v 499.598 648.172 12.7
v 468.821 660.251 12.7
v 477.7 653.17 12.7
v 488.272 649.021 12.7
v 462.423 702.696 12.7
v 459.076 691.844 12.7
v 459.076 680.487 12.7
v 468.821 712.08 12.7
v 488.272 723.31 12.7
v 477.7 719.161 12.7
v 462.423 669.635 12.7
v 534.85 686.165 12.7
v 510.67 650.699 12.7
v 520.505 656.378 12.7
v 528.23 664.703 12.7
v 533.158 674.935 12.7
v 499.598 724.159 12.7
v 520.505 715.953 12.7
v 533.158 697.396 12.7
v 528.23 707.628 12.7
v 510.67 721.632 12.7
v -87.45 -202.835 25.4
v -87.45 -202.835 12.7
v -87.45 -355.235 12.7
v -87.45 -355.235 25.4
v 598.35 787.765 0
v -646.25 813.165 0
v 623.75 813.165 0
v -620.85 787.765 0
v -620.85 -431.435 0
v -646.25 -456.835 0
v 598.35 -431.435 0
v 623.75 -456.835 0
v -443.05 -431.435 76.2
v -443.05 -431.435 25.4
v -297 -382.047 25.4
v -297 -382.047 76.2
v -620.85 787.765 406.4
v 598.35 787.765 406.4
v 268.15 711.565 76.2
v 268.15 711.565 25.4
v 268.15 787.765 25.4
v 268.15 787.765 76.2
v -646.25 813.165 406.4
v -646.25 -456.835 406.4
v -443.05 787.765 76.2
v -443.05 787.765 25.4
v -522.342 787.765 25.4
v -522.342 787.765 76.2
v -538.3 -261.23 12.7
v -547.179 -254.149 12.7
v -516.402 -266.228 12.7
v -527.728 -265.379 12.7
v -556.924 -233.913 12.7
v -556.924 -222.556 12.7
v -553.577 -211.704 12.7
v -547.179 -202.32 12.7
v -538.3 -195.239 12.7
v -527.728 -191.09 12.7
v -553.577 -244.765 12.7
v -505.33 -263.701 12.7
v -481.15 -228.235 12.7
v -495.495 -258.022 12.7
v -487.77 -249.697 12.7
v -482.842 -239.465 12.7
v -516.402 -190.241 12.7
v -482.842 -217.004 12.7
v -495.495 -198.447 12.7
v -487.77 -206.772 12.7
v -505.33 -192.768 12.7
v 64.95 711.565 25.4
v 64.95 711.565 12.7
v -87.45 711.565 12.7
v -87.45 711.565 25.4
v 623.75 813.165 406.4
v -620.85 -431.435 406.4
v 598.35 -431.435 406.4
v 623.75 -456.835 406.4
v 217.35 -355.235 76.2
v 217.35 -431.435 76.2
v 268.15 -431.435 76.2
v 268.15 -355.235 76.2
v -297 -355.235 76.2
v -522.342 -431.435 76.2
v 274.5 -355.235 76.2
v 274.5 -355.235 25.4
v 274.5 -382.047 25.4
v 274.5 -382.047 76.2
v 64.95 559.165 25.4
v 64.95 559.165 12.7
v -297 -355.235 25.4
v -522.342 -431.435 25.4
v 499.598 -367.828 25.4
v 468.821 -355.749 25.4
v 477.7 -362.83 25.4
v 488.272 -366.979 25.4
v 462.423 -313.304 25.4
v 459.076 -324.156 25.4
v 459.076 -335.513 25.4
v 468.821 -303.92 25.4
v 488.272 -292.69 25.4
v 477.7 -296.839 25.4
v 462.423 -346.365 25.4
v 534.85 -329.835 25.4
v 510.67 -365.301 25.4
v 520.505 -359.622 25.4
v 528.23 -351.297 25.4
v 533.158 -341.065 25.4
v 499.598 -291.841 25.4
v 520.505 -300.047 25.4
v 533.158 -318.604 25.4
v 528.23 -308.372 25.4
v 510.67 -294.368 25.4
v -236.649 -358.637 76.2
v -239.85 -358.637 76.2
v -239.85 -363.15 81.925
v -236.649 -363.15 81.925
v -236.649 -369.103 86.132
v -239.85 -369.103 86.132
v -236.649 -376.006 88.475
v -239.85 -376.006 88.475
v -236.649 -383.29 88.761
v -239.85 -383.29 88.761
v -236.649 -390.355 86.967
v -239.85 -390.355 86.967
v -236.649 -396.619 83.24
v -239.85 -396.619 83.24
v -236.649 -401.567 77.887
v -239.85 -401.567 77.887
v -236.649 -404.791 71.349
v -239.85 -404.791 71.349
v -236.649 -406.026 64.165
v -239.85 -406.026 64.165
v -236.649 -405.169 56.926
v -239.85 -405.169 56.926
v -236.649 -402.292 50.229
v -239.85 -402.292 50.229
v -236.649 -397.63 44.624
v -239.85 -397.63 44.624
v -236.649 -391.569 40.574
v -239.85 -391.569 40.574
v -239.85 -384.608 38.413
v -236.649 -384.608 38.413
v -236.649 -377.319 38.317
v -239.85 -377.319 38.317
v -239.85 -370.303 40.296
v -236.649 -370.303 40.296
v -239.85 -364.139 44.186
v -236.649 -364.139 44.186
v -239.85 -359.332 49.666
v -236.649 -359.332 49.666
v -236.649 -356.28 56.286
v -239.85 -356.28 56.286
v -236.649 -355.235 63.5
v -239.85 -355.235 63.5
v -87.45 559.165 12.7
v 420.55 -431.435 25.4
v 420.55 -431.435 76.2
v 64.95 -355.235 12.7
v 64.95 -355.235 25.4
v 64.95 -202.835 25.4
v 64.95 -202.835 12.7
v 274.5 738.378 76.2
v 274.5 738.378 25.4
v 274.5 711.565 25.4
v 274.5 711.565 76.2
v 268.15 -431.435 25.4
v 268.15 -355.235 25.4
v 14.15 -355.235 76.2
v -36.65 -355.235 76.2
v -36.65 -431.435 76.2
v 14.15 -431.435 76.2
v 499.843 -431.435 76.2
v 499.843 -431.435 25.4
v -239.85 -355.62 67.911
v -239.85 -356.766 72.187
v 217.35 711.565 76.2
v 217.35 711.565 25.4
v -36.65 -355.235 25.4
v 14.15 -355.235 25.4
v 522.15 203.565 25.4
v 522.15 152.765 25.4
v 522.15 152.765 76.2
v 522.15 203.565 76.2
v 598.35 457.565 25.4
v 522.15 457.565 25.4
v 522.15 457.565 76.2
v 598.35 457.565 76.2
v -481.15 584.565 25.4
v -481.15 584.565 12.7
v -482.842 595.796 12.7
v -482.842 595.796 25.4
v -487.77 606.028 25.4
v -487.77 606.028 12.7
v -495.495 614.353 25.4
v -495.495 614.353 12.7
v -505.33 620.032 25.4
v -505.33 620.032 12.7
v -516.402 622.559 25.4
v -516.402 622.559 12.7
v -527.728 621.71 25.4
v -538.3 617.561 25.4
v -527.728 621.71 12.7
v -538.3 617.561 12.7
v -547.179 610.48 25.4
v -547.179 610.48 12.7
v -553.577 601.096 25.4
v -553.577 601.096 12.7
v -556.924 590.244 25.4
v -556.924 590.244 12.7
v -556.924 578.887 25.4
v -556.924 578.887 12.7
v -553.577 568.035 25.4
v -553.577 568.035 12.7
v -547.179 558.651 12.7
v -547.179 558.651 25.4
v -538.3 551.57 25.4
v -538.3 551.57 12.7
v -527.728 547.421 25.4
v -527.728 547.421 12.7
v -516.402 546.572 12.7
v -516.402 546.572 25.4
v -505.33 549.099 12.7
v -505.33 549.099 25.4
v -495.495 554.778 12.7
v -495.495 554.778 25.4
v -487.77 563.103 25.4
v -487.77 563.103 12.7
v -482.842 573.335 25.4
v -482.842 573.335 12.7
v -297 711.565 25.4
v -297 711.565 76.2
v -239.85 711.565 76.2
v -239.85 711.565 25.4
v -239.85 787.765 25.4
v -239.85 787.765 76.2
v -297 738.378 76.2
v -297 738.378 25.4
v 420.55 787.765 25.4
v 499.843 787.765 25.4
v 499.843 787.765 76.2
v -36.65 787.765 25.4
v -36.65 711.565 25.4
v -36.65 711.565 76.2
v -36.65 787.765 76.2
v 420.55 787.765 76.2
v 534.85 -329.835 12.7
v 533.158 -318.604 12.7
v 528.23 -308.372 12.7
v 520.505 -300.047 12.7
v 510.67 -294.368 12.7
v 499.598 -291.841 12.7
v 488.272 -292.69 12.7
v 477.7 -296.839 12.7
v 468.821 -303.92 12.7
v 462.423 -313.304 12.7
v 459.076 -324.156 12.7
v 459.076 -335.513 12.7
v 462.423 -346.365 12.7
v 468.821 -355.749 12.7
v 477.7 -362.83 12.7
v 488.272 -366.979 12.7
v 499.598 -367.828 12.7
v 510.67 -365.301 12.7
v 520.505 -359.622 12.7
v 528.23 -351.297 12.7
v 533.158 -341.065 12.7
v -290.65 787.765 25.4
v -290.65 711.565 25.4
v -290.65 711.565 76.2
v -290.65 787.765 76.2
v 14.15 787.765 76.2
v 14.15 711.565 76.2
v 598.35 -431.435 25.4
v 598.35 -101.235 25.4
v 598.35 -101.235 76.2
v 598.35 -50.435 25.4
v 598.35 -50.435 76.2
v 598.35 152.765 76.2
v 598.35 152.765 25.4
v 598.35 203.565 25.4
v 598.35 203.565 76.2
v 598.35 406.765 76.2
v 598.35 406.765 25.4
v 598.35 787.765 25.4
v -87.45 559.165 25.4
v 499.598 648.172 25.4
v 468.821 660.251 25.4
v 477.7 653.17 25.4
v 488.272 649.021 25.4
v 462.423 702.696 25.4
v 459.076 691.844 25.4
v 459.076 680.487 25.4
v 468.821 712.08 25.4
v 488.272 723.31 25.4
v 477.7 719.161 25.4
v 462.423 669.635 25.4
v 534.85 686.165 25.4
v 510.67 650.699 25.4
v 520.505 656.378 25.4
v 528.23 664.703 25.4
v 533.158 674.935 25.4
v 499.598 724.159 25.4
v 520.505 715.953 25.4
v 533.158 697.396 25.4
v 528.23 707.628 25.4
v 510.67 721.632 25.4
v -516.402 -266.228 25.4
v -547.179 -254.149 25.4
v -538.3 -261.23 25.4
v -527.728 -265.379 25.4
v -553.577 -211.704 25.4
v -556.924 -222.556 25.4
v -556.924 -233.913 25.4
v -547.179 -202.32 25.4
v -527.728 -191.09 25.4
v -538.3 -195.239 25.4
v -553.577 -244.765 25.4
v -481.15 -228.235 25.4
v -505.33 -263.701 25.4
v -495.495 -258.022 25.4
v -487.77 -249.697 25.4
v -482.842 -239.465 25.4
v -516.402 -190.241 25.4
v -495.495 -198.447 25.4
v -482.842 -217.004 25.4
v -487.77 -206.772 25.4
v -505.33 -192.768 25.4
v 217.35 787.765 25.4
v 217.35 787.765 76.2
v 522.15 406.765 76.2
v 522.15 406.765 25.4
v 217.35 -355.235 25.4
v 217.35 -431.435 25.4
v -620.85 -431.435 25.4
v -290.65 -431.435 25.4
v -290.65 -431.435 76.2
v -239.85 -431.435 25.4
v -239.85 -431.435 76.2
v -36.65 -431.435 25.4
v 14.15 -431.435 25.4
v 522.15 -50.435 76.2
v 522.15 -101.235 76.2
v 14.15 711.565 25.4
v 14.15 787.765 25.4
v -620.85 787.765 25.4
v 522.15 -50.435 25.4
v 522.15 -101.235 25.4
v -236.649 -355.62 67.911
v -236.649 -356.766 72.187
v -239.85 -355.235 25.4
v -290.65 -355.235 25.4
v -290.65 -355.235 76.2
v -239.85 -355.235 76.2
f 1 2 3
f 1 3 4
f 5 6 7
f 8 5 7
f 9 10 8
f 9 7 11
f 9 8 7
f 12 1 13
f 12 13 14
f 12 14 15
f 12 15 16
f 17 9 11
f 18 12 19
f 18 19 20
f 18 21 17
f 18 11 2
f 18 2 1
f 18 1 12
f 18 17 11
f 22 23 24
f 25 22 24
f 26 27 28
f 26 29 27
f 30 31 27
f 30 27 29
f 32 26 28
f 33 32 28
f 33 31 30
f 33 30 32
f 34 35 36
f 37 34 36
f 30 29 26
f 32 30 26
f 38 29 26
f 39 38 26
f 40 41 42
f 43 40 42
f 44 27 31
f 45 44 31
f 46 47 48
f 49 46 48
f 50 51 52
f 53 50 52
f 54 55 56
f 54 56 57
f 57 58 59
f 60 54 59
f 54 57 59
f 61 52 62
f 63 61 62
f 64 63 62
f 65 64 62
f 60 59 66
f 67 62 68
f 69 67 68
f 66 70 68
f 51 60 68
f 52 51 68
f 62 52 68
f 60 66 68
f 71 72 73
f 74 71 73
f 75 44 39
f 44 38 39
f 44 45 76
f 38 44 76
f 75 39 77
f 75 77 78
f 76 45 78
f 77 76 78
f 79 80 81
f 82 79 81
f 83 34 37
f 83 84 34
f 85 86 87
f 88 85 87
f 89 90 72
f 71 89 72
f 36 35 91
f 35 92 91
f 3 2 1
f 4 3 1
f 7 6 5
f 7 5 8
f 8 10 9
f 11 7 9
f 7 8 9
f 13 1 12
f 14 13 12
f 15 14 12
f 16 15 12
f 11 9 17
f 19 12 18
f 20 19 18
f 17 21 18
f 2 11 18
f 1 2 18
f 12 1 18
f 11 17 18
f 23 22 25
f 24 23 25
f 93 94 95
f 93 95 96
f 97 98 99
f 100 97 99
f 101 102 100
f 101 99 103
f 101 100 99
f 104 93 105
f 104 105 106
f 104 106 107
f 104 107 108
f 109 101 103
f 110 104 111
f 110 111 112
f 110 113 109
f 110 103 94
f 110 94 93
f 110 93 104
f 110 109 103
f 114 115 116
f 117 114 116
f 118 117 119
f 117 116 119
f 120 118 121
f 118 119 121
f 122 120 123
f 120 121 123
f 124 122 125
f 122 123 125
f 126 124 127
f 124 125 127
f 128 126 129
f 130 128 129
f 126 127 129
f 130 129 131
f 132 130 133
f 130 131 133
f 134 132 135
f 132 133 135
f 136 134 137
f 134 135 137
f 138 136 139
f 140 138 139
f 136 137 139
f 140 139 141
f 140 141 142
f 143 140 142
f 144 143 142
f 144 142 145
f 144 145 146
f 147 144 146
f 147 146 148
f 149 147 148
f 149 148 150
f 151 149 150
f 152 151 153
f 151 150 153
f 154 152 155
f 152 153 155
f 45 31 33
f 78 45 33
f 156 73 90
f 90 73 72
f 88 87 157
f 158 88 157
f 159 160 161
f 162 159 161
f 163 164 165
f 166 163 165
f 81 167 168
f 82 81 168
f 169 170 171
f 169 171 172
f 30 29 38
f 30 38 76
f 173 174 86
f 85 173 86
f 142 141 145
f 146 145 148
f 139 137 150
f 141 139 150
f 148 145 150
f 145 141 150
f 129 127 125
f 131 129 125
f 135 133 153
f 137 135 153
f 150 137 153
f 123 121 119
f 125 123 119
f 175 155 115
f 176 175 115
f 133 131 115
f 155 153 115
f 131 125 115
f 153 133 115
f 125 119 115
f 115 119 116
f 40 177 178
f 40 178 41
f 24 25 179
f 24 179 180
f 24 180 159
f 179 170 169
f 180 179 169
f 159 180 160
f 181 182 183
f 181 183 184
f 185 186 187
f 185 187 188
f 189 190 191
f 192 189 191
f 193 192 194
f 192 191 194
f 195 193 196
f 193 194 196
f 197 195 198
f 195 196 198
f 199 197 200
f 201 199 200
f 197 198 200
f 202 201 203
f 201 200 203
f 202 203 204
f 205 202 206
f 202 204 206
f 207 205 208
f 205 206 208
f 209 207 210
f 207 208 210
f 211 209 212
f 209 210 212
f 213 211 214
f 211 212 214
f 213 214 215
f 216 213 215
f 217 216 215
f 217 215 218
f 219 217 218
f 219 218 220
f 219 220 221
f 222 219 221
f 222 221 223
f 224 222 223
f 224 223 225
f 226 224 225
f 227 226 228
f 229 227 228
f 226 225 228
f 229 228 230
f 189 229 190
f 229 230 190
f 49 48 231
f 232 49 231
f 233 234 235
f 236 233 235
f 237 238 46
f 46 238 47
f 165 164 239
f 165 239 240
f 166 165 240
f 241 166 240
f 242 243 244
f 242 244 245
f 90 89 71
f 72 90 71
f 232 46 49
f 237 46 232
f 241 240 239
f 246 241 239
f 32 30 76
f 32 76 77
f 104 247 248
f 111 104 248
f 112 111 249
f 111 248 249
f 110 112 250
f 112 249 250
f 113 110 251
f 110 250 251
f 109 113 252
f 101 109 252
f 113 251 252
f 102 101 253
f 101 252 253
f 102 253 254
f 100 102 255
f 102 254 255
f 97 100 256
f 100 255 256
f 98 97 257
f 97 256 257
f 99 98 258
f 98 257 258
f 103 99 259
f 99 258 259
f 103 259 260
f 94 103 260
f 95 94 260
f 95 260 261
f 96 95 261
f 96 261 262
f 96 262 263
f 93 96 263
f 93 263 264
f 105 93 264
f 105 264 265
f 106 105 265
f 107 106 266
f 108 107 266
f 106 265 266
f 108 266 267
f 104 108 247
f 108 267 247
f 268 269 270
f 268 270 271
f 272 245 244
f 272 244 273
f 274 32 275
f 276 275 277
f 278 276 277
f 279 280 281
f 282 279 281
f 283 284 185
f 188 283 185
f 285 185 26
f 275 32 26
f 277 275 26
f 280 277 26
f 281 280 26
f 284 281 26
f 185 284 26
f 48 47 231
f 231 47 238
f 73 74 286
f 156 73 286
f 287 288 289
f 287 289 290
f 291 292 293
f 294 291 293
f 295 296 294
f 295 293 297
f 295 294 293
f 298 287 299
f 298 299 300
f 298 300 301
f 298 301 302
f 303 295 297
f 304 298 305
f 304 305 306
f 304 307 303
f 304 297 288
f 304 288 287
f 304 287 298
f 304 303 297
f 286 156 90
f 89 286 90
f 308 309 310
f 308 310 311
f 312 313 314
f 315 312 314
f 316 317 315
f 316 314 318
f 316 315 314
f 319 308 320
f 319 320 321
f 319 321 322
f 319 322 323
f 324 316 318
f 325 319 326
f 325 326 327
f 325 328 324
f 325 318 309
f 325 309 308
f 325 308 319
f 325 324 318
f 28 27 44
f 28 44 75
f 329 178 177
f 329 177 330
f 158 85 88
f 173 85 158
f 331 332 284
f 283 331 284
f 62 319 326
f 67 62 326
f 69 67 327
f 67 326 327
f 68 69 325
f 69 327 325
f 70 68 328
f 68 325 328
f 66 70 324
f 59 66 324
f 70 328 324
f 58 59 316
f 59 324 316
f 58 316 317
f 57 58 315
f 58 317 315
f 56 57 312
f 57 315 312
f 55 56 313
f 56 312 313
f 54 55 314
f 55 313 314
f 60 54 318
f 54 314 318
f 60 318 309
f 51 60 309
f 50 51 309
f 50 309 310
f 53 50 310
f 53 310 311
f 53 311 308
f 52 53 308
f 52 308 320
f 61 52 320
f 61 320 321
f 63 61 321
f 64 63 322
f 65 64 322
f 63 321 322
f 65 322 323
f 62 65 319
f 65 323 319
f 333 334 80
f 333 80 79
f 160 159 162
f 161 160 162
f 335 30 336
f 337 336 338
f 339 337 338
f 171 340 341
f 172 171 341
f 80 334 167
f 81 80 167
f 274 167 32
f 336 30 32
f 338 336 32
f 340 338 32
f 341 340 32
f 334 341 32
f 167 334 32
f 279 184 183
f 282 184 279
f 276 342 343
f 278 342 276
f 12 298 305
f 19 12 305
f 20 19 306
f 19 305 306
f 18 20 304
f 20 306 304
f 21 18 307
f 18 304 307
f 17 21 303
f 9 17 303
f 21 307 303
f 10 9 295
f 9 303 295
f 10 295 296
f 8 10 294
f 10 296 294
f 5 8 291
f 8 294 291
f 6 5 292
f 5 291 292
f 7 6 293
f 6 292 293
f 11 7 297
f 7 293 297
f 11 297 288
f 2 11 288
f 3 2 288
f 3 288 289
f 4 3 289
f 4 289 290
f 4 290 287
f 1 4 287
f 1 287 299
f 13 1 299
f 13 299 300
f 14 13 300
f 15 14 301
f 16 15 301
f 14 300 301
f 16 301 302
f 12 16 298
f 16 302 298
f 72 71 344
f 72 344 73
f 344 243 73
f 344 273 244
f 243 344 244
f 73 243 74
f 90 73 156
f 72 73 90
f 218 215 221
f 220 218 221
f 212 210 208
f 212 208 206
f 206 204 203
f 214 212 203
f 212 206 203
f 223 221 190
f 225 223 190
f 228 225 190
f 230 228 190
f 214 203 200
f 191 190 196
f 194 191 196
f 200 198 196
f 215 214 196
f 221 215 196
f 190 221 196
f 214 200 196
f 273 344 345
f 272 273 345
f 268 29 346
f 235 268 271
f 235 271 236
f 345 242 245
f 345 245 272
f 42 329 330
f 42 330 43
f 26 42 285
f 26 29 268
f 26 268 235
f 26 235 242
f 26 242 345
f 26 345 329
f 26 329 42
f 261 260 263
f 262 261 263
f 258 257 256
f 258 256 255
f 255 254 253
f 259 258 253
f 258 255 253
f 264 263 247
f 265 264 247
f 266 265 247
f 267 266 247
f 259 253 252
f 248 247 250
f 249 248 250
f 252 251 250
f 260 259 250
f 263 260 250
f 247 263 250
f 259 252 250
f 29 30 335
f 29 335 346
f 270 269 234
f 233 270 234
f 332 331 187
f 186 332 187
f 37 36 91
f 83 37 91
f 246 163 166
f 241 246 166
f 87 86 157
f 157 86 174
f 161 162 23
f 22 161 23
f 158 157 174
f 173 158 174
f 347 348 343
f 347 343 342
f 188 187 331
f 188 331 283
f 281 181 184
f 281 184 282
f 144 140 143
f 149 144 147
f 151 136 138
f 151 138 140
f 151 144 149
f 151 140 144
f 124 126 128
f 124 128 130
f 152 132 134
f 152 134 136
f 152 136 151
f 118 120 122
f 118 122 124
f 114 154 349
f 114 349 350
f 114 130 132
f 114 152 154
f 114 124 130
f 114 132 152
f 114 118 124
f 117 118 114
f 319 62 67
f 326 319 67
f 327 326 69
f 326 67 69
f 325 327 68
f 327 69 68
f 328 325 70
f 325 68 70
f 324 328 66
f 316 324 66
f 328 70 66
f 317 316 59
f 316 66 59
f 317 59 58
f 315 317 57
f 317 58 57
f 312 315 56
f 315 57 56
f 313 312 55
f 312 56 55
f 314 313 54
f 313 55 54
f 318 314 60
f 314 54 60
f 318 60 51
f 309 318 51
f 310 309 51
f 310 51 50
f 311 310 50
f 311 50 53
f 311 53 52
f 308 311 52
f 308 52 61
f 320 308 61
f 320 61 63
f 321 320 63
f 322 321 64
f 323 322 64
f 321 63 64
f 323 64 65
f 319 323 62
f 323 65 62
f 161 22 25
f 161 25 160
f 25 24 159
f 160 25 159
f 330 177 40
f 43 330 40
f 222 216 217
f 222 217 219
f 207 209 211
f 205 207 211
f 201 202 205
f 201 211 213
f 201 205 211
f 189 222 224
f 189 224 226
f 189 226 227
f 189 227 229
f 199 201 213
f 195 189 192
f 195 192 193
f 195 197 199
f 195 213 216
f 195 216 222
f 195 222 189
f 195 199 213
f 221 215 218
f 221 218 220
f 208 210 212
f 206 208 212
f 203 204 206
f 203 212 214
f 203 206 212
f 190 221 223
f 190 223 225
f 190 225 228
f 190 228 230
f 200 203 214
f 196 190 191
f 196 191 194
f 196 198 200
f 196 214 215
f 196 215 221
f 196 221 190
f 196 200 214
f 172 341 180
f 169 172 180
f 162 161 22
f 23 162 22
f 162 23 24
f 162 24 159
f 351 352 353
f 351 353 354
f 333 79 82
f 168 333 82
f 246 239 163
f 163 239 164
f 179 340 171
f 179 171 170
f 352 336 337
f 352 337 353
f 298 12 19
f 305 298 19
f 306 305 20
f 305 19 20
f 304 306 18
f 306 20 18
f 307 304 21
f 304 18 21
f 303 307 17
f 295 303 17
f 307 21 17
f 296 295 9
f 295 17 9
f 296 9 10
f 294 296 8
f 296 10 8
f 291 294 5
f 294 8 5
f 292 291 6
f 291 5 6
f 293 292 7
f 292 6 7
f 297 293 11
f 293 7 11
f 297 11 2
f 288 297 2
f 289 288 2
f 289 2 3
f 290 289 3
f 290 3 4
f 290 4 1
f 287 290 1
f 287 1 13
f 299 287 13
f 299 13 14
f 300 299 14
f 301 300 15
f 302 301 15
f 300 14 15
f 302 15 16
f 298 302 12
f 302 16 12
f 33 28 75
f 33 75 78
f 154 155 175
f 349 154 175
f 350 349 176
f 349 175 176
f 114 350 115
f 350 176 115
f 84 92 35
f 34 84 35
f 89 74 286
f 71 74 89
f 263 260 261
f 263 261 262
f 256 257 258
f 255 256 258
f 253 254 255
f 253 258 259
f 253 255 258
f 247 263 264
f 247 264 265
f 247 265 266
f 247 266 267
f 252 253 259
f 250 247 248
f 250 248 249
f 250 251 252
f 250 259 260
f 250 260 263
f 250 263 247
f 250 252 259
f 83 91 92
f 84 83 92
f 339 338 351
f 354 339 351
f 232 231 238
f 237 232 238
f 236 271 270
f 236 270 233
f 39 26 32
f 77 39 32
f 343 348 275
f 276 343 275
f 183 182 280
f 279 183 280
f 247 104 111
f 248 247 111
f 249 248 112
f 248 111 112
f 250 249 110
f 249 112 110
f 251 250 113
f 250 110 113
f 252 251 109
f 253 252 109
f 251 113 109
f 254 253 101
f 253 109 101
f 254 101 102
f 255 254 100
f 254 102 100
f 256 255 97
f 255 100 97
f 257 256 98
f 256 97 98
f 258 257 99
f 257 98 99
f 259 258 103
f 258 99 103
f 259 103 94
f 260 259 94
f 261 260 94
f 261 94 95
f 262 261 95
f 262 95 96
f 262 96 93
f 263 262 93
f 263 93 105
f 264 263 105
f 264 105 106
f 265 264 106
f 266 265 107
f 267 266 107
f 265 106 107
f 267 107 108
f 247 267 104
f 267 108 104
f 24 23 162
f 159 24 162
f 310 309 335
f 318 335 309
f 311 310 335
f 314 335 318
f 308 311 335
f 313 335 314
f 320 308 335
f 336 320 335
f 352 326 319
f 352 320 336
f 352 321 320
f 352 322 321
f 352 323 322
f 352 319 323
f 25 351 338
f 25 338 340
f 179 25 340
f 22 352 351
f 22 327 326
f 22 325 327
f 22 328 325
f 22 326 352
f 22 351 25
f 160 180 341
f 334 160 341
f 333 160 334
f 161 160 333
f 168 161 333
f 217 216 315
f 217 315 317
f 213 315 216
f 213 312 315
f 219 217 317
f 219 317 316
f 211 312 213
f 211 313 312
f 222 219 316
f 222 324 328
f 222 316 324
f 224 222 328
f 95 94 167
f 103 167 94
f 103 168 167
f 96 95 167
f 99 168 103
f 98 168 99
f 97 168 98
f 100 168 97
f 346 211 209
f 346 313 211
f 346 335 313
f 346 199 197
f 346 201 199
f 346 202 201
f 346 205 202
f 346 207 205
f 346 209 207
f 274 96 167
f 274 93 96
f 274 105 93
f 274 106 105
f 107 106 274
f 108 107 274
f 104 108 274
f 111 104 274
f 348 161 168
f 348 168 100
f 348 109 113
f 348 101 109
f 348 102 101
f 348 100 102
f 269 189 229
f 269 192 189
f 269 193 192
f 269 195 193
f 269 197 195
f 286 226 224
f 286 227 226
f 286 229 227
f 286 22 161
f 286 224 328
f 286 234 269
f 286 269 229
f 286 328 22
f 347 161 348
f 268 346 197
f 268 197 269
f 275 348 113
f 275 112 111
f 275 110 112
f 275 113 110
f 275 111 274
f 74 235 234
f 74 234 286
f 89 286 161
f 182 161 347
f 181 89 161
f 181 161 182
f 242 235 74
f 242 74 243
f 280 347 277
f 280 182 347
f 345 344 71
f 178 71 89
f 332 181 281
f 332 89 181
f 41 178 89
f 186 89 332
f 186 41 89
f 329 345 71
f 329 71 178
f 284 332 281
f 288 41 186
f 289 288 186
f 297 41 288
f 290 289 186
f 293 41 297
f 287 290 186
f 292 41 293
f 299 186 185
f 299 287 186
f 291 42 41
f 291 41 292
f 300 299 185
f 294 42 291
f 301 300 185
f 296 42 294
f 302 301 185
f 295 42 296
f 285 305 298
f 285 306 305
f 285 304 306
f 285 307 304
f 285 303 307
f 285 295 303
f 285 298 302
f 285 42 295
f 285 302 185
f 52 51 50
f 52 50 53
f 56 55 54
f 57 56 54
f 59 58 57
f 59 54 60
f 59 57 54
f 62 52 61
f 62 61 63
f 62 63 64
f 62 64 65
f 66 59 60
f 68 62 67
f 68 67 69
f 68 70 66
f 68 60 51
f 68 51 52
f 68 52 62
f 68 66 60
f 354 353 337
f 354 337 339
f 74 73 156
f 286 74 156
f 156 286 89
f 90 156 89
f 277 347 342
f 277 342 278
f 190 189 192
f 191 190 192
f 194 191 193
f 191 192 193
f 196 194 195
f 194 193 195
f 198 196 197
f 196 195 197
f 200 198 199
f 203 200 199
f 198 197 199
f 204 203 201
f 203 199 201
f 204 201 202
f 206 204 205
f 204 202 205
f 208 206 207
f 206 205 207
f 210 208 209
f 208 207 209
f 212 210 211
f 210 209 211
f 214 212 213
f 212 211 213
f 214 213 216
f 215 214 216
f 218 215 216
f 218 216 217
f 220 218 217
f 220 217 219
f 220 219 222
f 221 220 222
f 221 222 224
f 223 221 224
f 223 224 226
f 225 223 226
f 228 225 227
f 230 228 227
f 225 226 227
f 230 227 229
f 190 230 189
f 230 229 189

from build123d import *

# Parameters (mm, degrees)
F0_W      = 1219.2
F0_H      = 1219.2
F1_DEPTH  = 25.4
F2_W      = 50.8
F2_H      = 76.2
F3_DEPTH  = 50.8
F5_DEPTH  = 50.8
F6_W      = 76.2
F6_H      = 50.8
F7_DEPTH  = 50.8
F8_W      = 1320.8
F8_H      = 1320.8
F8_W_2    = 1219.2
F8_H_2    = 1219.2
F9_DEPTH  = 609.6
F10_DEPTH = 25.4
F11_DEPTH = 25.4
F12_DEPTH = 25.4
F13_DEPTH = 25.4
F14_DEPTH = 203.2
F16_DEPTH = 12.7
F17_DEPTH = 12.7
F18_R     = 38.1
F19_DEPTH = 12.7
F20_DEPTH = 12.7
F22_DEPTH = 3.2004


with BuildPart() as f1:
    # F0 (on Top) → F1 (new body)
    with BuildSketch(Plane.XY):
        with Locations((-11.2496111542, 178.1654882305)):
            Rectangle(F0_W, F0_H)
    extrude(amount=F1_DEPTH)

    # F2 (on face) → F3 (join)
    with BuildSketch(Plane.XY.offset(25.4)):
        with Locations((-265.2496111542, 749.6654882305)):
            Rectangle(F2_W, F2_H)
        with Locations((-11.2496111542, 749.6654882305)):
            Rectangle(F2_W, F2_H)
        with Locations((242.7503888458, 749.6654882305)):
            Rectangle(F2_W, F2_H)
        with Locations((-265.2496111542, -393.3345117695)):
            Rectangle(F2_W, F2_H)
        with Locations((-11.2496111542, -393.3345117695)):
            Rectangle(F2_W, F2_H)
        with Locations((242.7503888458, -393.3345117695)):
            Rectangle(F2_W, F2_H)
    extrude(amount=F3_DEPTH)

    # F6 (on face) → F7 (join)
    with BuildSketch(Plane.XY.offset(25.4)):
        with Locations((560.2503888458, 432.1654882305)):
            Rectangle(F6_W, F6_H)
        with Locations((560.2503888458, 178.1654882305)):
            Rectangle(F6_W, F6_H)
        with Locations((560.2503888458, -75.8345117695)):
            Rectangle(F6_W, F6_H)
    extrude(amount=F7_DEPTH)

    # F15 (on face) → F16 (cut)
    with BuildSketch(Plane.XY.offset(25.4)):
        Polygon((14.1503888458, 711.5654882305), (-36.6496111542, 711.5654882305), (-87.4496111542, 711.5654882305), (-87.4496111542, 559.1654882305), (64.9503888458, 559.1654882305), (64.9503888458, 711.5654882305), align=None)
        Polygon((64.9503888458, -355.2345117695), (64.9503888458, -202.8345117695), (-87.4496111542, -202.8345117695), (-87.4496111542, -355.2345117695), (-36.6496111542, -355.2345117695), (14.1503888458, -355.2345117695), align=None)
    extrude(amount=-F16_DEPTH, mode=Mode.SUBTRACT)


with BuildPart() as f5:
    # F4 (on face) → F5 (new body)
    with BuildSketch(Plane.XY.offset(25.4)):
        Polygon((-296.9996111542, 738.3783945932), (-443.0496111542, 787.7654882305), (-522.3420879098, 787.7654882305), (-296.9996111542, 711.5654882305), align=None)
    extrude(amount=F5_DEPTH)


with BuildPart() as f5b:
    # F4 (on face) → F5, piece 2 (new body)
    with BuildSketch(Plane.XY.offset(25.4)):
        Polygon((274.5003888458, 711.5654882305), (499.8428656014, 787.7654882305), (420.5503888458, 787.7654882305), (274.5003888458, 738.3783945932), align=None)
    extrude(amount=F5_DEPTH)


with BuildPart() as f5c:
    # F4 (on face) → F5, piece 3 (new body)
    with BuildSketch(Plane.XY.offset(25.4)):
        Polygon((499.8428656014, -431.4345117695), (274.5003888458, -355.2345117695), (274.5003888458, -382.0474181321), (420.5503888458, -431.4345117695), align=None)
    extrude(amount=F5_DEPTH)


with BuildPart() as f5d:
    # F4 (on face) → F5, piece 4 (new body)
    with BuildSketch(Plane.XY.offset(25.4)):
        Polygon((-522.3420879098, -431.4345117695), (-443.0496111542, -431.4345117695), (-296.9996111542, -382.0474181321), (-296.9996111542, -355.2345117695), align=None)
    extrude(amount=F5_DEPTH)


with BuildPart() as f9:
    # F8 (on face) → F9 (new body)
    with BuildSketch(Plane(origin=(0, 0, 0), x_dir=(1, 0, 0), z_dir=(0, 0, -1))):
        with Locations((-11.2496111542, -178.1654882305)):
            Rectangle(F8_W, F8_H)
        with Locations((-11.2496111542, -178.1654882305)):
            Rectangle(F8_W_2, F8_H_2, mode=Mode.SUBTRACT)
    extrude(amount=-F9_DEPTH)

    # F10 (cut): a face of the model
    f10_faces = [f9.faces().sort_by_distance(p)[0] for p in [
        (-11.2496111542, 838.5654882305, 304.8),
    ]]
    extrude(f10_faces, amount=-F10_DEPTH, mode=Mode.SUBTRACT)

    # F11 (cut): a face of the model
    f11_faces = [f9.faces().sort_by_distance(p)[0] for p in [
        (-671.6496111542, 165.4654882305, 304.8),
    ]]
    extrude(f11_faces, amount=-F11_DEPTH, mode=Mode.SUBTRACT)

    # F12 (cut): a face of the model
    f12_faces = [f9.faces().sort_by_distance(p)[0] for p in [
        (1.4503888458, -482.2345117695, 304.8),
    ]]
    extrude(f12_faces, amount=-F12_DEPTH, mode=Mode.SUBTRACT)

    # F13 (cut): a face of the model
    f13_faces = [f9.faces().sort_by_distance(p)[0] for p in [
        (649.1503888458, 178.1654882305, 304.8),
    ]]
    extrude(f13_faces, amount=-F13_DEPTH, mode=Mode.SUBTRACT)

    # F14 (cut): a face of the model
    f14_faces = [f9.faces().sort_by_distance(p)[0] for p in [
        (605.7898766037, 178.1654882305, 609.6),
    ]]
    extrude(f14_faces, amount=-F14_DEPTH, mode=Mode.SUBTRACT)


with BuildPart() as f17:
    # F17 (new): a face of the model
    f17_faces = [f1.part.faces().sort_by_distance(p)[0] for p in [
        (-11.2496111542, 635.3654882305, 12.7),
    ]]
    extrude(f17_faces, amount=F17_DEPTH)


with BuildPart() as f17b:
    # F17#2 (new): a face of the model
    f17_2_faces = [f1.part.faces().sort_by_distance(p)[0] for p in [
        (-11.2496111542, -279.0345117695, 12.7),
    ]]
    extrude(f17_2_faces, amount=F17_DEPTH)


with BuildPart() as f1_1:
    add(f1.part)

    # F18 (on face) → F19 (cut)
    with BuildSketch(Plane.XY.offset(25.4)):
        with Locations((-519.2496111542, 584.5654882305)):
            Circle(F18_R)
        with Locations((-519.2496111542, -228.2345117695)):
            Circle(F18_R)
        with Locations((496.7503888458, -329.8345117695)):
            Circle(F18_R)
        with Locations((496.7503888458, 686.1654882305)):
            Circle(F18_R)
    extrude(amount=-F19_DEPTH, mode=Mode.SUBTRACT)


with BuildPart() as f20:
    # F20 (new): a face of the model
    f20_faces = [f1_1.part.faces().sort_by_distance(p)[0] for p in [
        (-519.2496111542, -228.2345117695, 12.7),
    ]]
    extrude(f20_faces, amount=F20_DEPTH)


with BuildPart() as f20b:
    # F20#2 (new): a face of the model
    f20_2_faces = [f1_1.part.faces().sort_by_distance(p)[0] for p in [
        (-519.2496111542, 584.5654882305, 12.7),
    ]]
    extrude(f20_2_faces, amount=F20_DEPTH)


with BuildPart() as f20c:
    # F20#3 (new): a face of the model
    f20_3_faces = [f1_1.part.faces().sort_by_distance(p)[0] for p in [
        (496.7503888458, 686.1654882305, 12.7),
    ]]
    extrude(f20_3_faces, amount=F20_DEPTH)


with BuildPart() as f20d:
    # F20#4 (new): a face of the model
    f20_4_faces = [f1_1.part.faces().sort_by_distance(p)[0] for p in [
        (496.7503888458, -329.8345117695, 12.7),
    ]]
    extrude(f20_4_faces, amount=F20_DEPTH)


with BuildPart() as f22:
    # F21 (on face) → F22 (new body)
    with BuildSketch(Plane.YZ.offset(-239.8496111542)):
        with BuildLine():
            ThreePointArc((-402.6315570256, 76.2), (-387.2085155151, 38.9654840123), (-355.2345117695, 63.5))
            ThreePointArc((-355.2345117695, 63.5), (-356.0999957817, 70.0740037456), (-358.6374665134, 76.2))
            Line((-358.6374665134, 76.2), (-402.6315570256, 76.2))
        make_face()
        with BuildLine():
            Line((-402.6315570256, 76.2), (-358.6374665134, 76.2))
            ThreePointArc((-358.6374665134, 76.2), (-380.6345117695, 88.9), (-402.6315570256, 76.2))
        make_face()
    extrude(amount=F22_DEPTH)


solid = Compound([f5.part, f5b.part, f5c.part, f5d.part, f9.part, f17.part, f17b.part, f1_1.part, f20.part, f20b.part, f20c.part, f20d.part, f22.part])
